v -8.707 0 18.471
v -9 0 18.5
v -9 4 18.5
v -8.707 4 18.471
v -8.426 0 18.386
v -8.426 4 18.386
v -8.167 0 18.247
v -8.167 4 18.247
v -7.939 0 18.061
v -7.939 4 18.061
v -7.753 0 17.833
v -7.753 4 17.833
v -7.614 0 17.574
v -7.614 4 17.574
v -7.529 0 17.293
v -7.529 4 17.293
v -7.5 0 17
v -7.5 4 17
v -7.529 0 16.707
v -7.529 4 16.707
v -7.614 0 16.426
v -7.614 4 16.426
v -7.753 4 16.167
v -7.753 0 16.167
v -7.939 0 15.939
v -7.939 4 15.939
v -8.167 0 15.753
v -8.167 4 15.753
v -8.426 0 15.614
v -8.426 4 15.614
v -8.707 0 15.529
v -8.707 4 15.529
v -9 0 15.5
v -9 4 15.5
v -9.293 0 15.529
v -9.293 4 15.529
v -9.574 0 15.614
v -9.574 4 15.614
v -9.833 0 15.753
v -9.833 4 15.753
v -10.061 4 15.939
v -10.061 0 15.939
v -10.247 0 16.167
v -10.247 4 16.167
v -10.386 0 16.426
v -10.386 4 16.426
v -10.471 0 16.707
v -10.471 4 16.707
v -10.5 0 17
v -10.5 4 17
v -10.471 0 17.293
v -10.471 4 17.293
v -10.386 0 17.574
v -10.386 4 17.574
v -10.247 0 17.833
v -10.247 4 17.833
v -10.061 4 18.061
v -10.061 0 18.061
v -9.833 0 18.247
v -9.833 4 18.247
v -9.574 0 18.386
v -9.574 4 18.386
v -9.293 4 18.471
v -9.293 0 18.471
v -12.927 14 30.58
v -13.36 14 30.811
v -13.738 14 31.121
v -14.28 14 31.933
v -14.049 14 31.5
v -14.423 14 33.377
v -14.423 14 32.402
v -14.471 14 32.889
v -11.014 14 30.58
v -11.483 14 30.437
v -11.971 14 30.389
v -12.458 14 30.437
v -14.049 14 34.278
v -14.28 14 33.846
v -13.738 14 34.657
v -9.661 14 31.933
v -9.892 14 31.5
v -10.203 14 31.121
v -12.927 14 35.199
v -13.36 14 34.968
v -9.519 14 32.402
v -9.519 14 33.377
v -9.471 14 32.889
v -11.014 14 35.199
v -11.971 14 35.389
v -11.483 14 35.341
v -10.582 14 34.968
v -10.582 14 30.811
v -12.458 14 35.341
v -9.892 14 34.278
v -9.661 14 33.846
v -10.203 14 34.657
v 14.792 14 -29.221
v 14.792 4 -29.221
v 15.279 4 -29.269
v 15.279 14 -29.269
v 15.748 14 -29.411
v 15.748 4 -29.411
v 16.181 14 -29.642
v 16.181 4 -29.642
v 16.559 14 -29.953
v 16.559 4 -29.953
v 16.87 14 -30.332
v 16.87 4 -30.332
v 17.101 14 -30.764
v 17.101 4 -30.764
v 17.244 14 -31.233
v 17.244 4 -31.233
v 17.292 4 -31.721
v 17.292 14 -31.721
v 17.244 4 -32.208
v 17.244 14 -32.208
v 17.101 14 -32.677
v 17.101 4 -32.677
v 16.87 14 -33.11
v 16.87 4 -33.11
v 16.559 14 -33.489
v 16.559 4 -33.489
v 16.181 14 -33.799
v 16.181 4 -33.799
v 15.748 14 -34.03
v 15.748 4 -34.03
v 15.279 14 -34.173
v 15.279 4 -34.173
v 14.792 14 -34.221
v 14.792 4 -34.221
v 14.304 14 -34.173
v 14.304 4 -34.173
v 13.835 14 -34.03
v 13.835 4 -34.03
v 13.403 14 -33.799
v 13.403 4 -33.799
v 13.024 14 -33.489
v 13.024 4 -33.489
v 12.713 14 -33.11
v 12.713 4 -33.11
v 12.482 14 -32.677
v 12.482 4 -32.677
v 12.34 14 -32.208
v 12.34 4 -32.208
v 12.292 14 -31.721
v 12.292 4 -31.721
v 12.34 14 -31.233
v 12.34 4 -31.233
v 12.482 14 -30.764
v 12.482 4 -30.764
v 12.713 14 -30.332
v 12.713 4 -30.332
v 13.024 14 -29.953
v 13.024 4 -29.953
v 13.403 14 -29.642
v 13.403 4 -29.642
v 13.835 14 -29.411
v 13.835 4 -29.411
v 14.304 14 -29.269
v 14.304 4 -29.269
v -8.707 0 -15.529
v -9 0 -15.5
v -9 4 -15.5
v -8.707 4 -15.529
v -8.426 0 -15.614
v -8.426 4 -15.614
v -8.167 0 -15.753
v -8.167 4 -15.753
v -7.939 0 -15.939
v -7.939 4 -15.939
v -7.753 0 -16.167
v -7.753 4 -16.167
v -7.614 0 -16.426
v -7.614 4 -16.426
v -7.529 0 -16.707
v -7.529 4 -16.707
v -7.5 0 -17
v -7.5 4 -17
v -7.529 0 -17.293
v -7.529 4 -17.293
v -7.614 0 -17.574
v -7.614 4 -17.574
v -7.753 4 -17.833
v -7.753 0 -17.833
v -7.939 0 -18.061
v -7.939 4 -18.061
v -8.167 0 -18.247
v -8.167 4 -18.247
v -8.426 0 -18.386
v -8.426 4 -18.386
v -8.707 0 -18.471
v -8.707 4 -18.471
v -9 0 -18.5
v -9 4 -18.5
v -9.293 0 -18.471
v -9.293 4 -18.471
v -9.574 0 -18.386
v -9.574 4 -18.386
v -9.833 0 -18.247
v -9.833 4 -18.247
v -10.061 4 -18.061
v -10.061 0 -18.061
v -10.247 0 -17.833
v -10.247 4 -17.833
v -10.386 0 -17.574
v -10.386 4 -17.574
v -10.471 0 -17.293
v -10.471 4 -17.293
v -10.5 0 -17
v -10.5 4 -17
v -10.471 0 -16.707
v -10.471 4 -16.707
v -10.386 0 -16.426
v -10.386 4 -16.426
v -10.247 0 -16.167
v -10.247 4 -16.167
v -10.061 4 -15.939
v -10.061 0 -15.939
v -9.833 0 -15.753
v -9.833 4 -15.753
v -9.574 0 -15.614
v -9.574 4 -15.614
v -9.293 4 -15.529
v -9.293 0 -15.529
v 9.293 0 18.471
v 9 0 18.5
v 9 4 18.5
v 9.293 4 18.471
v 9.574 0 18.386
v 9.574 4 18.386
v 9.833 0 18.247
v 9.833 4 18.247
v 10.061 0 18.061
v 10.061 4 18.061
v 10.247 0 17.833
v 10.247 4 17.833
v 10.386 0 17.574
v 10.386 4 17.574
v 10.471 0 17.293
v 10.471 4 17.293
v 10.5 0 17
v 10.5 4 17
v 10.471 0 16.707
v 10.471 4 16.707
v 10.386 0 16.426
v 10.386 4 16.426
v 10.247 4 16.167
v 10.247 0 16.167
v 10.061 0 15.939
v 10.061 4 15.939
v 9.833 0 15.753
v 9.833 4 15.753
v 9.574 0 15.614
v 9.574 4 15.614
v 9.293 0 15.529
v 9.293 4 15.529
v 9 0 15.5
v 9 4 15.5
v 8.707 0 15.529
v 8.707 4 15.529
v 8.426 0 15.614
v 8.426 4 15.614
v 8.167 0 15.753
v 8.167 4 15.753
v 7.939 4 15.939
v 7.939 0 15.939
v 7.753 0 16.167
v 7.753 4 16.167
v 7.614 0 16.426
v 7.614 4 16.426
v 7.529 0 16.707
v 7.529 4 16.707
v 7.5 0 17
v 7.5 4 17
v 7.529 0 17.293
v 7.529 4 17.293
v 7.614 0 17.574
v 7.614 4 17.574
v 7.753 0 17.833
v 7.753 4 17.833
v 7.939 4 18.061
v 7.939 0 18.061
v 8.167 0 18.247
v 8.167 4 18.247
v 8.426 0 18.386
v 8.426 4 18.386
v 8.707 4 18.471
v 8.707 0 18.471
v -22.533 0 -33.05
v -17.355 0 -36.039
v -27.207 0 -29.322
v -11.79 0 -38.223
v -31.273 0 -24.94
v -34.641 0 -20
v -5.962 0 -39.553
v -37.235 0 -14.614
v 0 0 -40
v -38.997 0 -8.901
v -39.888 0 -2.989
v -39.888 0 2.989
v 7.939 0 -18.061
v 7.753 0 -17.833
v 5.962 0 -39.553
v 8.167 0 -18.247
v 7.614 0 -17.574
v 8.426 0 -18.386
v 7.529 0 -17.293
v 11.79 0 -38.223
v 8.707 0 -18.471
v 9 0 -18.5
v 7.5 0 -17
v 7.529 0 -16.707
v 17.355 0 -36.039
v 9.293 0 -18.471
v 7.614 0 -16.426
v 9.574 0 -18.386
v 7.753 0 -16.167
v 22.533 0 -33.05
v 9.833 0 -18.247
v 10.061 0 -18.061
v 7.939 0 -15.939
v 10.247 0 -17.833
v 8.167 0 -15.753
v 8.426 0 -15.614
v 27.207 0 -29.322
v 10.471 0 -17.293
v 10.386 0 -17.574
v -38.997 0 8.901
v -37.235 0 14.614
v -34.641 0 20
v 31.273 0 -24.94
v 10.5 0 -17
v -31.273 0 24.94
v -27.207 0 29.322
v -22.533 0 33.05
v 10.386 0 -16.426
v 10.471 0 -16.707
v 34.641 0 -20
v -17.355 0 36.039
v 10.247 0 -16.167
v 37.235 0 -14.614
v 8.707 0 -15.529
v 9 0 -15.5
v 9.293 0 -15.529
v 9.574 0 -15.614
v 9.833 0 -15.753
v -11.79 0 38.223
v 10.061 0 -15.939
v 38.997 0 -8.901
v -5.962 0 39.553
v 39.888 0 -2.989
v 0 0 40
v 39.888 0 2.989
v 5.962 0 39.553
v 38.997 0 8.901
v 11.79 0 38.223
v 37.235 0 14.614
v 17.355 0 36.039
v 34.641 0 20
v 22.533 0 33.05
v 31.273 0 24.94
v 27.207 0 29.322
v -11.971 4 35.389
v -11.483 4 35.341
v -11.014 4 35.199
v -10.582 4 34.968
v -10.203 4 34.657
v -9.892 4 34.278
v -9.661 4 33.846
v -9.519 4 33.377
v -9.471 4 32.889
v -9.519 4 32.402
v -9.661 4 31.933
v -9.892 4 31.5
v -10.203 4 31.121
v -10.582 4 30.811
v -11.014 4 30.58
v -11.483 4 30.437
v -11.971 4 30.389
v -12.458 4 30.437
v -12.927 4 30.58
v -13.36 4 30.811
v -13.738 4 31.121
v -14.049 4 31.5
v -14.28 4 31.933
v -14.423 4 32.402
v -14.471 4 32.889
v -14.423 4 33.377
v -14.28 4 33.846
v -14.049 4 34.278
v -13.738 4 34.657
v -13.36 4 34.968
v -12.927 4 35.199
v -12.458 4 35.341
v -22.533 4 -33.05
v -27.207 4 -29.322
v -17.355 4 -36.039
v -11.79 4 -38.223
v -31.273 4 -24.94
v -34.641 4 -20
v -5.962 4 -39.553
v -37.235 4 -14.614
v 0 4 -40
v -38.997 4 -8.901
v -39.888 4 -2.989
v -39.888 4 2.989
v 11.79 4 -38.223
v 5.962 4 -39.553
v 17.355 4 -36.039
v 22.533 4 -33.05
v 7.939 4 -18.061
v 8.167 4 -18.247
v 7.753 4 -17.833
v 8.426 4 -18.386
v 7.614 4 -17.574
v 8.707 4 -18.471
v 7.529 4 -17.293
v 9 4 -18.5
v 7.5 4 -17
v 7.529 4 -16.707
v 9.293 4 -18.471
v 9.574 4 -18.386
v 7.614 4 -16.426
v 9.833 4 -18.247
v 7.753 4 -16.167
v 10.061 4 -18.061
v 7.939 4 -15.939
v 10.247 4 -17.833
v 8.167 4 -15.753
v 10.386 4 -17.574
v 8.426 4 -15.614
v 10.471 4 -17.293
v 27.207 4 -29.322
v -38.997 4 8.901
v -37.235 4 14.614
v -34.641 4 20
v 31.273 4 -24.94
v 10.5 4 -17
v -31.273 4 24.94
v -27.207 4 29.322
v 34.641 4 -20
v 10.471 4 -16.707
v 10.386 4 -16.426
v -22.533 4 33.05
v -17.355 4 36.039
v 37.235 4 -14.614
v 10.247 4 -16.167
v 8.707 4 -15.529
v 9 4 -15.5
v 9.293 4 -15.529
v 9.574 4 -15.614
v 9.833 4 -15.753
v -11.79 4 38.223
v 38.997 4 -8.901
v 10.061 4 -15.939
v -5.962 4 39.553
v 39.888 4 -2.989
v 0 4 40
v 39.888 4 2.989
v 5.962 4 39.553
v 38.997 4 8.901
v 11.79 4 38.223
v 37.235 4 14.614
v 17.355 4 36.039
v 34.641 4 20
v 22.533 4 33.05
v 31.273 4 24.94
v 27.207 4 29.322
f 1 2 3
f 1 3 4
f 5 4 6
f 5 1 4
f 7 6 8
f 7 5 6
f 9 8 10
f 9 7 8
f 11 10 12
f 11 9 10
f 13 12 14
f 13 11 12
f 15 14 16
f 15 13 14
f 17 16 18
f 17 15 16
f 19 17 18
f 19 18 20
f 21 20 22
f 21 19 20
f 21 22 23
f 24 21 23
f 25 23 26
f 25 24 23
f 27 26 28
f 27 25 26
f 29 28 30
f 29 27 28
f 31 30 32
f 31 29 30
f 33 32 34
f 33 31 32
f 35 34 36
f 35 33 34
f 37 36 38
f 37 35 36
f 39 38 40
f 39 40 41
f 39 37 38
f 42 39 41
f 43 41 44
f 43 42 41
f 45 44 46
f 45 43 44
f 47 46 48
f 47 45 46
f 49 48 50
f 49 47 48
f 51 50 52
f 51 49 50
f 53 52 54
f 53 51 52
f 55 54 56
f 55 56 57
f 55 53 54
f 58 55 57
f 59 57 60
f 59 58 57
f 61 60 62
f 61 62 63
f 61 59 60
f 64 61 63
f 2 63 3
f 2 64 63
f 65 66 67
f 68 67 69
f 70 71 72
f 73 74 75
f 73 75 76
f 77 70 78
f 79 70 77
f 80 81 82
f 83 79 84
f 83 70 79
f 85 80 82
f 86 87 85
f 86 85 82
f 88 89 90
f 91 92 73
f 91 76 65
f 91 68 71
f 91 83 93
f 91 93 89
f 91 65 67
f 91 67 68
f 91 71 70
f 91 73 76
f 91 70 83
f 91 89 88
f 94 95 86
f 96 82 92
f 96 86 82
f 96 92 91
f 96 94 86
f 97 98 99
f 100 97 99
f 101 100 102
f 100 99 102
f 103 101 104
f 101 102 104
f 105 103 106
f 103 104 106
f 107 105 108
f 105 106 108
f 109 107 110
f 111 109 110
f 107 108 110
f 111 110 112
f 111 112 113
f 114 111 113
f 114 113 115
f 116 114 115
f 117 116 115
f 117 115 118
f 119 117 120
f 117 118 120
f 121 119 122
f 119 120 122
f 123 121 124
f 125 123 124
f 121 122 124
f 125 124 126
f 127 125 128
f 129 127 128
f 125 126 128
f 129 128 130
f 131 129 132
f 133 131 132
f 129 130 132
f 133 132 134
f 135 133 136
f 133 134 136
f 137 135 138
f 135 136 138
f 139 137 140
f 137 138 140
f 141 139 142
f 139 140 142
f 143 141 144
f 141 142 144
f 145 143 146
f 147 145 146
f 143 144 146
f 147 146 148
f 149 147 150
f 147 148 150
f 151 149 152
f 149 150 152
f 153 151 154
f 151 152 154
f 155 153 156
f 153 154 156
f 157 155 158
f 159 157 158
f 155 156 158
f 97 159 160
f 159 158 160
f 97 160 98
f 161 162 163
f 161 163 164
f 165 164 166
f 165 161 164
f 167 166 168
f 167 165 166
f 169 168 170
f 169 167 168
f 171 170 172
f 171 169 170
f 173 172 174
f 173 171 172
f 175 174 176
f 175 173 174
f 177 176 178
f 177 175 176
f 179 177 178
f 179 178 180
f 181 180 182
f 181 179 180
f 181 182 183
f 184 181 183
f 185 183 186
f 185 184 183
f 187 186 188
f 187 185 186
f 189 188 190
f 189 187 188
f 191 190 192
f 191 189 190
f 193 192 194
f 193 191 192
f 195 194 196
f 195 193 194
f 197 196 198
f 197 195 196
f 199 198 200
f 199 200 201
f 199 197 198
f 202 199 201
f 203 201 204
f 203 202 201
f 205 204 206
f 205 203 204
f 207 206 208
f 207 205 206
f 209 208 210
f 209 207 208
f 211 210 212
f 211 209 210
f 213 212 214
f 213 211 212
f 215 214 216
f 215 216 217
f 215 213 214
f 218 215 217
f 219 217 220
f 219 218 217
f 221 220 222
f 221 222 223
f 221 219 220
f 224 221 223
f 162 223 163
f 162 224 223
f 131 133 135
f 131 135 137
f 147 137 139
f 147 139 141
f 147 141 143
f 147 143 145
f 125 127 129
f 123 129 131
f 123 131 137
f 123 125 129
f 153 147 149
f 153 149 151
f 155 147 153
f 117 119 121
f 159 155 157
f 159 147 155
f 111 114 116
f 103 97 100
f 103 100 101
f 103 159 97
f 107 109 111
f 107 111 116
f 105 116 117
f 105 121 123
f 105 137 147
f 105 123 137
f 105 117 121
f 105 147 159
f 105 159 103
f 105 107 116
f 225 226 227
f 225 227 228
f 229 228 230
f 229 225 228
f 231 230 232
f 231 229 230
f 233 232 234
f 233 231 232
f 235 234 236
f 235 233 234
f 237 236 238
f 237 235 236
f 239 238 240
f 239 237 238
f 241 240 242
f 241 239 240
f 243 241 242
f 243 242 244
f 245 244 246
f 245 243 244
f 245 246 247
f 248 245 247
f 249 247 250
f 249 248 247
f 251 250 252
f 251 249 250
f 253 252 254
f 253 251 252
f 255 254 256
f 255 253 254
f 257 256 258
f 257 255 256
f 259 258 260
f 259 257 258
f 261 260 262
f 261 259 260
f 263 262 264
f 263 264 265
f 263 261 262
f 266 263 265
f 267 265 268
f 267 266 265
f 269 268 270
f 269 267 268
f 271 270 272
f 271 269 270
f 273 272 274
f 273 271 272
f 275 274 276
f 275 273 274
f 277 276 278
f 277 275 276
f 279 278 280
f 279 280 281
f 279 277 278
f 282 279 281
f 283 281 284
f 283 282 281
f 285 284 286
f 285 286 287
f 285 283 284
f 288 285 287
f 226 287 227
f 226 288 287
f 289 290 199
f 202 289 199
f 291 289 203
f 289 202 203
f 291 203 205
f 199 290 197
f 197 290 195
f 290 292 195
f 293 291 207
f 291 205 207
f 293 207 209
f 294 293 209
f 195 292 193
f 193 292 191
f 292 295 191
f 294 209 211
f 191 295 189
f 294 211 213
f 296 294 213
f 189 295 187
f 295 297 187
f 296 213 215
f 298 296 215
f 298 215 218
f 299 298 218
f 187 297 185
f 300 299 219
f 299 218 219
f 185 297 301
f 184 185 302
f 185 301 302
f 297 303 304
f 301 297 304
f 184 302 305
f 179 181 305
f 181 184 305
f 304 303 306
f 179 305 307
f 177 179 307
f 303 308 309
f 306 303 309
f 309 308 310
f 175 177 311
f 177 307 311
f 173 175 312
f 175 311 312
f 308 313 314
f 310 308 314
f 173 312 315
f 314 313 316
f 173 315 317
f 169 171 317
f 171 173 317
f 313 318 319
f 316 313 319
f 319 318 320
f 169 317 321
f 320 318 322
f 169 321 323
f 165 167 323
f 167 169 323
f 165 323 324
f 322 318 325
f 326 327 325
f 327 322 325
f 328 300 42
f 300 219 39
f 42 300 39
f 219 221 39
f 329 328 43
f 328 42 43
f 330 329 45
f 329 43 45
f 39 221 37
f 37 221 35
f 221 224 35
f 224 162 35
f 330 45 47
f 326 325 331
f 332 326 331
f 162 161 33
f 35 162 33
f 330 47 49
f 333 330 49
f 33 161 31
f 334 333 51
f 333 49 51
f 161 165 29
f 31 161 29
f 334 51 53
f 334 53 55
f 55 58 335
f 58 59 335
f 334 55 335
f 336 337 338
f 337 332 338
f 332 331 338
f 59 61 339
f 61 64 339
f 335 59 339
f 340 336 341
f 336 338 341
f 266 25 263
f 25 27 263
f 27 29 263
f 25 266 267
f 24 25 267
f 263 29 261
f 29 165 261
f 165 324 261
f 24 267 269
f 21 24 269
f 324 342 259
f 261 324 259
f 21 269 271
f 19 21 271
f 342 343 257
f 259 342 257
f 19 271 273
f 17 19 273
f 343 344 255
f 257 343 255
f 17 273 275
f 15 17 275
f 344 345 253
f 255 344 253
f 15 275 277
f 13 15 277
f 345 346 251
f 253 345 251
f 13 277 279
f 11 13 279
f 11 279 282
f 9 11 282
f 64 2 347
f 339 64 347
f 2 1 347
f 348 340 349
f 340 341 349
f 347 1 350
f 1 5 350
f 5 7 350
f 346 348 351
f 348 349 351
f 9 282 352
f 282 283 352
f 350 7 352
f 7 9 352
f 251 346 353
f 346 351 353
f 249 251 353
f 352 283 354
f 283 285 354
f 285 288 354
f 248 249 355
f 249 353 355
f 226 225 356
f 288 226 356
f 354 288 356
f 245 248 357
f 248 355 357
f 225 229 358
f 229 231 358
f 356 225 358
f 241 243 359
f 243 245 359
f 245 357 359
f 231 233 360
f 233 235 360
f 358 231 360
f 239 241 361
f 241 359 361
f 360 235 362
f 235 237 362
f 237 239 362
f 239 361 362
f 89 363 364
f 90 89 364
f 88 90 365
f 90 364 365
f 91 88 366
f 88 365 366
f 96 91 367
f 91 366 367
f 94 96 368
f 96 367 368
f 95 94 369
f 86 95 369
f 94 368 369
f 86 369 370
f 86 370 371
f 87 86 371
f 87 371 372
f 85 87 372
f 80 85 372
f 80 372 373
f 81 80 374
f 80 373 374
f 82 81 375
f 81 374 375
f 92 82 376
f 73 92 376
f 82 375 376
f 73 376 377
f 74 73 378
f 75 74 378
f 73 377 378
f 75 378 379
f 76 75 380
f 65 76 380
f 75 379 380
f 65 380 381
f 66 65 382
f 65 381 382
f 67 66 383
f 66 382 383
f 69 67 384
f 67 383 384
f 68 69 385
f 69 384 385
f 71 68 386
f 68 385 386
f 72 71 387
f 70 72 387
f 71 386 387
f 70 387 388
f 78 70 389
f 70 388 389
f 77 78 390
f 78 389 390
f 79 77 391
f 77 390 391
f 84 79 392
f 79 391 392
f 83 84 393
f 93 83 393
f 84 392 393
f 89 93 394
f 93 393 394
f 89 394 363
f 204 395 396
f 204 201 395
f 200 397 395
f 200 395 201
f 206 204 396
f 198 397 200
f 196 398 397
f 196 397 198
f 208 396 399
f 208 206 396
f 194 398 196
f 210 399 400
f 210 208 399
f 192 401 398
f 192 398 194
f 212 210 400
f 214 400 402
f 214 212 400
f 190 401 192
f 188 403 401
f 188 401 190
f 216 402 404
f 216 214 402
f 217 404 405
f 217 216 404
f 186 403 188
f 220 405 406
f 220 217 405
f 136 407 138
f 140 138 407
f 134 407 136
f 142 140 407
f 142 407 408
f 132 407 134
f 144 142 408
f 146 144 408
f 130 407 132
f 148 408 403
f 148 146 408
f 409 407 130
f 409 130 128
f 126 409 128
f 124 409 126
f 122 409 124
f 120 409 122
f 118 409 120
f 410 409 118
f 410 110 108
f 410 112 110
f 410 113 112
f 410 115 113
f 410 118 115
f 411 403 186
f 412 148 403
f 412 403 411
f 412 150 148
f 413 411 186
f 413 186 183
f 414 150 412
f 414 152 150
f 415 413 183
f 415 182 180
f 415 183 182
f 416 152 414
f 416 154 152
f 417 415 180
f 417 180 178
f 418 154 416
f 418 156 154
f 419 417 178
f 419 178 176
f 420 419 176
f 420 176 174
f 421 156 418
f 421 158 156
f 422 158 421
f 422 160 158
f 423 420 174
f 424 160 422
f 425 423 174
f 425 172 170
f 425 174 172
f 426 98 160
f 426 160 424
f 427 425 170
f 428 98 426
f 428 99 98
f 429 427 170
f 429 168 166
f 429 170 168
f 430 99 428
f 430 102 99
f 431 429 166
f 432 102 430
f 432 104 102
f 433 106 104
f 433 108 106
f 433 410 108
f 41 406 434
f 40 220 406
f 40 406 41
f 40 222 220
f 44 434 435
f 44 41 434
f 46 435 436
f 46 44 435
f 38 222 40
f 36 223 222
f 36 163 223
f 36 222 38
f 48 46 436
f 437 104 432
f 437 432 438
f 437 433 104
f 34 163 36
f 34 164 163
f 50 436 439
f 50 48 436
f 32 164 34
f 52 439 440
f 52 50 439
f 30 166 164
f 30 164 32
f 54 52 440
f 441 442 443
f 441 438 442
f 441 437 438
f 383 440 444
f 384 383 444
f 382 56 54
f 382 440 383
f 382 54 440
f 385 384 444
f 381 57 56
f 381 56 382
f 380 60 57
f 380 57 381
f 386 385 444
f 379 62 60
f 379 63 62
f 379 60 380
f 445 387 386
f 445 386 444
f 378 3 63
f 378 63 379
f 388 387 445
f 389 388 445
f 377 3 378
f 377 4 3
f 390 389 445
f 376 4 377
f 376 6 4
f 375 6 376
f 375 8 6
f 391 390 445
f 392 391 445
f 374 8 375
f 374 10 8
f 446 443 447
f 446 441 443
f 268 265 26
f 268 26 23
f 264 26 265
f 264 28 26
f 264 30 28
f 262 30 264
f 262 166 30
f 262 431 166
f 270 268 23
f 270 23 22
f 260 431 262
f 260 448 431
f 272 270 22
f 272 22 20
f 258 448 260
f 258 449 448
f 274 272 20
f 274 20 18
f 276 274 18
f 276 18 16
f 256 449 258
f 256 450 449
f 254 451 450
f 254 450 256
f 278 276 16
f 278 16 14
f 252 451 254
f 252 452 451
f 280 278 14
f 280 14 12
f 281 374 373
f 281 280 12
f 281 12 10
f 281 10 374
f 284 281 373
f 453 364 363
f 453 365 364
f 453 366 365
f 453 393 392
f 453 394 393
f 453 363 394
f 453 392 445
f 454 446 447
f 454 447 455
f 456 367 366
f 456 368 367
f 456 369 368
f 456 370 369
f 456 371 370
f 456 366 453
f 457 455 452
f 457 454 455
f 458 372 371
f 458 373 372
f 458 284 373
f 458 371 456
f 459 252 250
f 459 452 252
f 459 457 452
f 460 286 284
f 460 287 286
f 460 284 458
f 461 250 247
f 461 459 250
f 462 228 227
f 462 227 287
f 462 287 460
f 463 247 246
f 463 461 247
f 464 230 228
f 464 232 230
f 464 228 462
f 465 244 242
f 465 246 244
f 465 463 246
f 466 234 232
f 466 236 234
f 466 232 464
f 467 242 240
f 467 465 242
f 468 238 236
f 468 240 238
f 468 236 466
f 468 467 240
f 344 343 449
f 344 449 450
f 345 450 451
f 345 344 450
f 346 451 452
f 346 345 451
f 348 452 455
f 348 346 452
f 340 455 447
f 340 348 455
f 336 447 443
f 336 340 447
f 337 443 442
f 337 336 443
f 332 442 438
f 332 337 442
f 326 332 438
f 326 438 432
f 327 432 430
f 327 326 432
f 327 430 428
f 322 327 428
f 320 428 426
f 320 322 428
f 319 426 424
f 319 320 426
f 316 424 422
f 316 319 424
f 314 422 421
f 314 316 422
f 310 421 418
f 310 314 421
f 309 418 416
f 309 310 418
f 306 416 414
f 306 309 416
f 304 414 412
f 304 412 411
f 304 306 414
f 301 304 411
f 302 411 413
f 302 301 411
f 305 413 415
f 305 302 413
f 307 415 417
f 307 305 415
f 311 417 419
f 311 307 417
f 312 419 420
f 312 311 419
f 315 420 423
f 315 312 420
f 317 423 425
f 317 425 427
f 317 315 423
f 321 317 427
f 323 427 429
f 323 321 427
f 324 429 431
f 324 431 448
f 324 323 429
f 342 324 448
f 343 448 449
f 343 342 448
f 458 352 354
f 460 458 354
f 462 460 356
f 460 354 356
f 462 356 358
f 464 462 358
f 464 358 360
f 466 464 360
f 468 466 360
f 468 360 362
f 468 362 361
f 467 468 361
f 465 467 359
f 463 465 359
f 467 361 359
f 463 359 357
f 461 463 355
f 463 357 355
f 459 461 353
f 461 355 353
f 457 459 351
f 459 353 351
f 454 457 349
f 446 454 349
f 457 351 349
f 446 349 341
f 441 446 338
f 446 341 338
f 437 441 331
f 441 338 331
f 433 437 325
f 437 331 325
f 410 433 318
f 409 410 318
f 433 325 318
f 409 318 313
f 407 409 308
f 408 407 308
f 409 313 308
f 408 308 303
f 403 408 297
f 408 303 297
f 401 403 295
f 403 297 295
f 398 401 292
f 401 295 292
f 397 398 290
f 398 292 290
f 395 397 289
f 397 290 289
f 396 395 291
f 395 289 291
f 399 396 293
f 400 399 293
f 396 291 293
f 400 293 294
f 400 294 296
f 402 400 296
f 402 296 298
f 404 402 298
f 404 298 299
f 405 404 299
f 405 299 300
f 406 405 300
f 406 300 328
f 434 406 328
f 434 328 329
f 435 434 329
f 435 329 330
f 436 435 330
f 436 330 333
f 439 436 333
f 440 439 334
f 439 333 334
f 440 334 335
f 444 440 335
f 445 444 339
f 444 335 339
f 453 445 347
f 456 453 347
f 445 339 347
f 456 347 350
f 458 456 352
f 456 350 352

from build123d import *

# Parameters (mm, degrees)
SKETCH1_R           = 40
SKETCH1_R_2         = 1.5
BOSS_EXTRUDE1_DEPTH = 4
SKETCH2_R           = 2.5
BOSS_EXTRUDE2_DEPTH = 10


with BuildPart() as part:
    # Sketch1 → Boss-Extrude1 (new body)
    with BuildSketch(Plane(origin=(0, 0, 0), x_dir=(1, 0, 0), z_dir=(0, 1, 0))):
        with Locations(Location((0, 0, 0), (0, 0, 270))):
            Circle(SKETCH1_R)
        with Locations(Location((9, 17, 0), (0, 0, 270))):
            Circle(SKETCH1_R_2, mode=Mode.SUBTRACT)
        with Locations(Location((-9, 17, 0), (0, 0, 270))):
            Circle(SKETCH1_R_2, mode=Mode.SUBTRACT)
        with Locations(Location((-9, -17, 0), (0, 0, 270))):
            Circle(SKETCH1_R_2, mode=Mode.SUBTRACT)
        with Locations(Location((9, -17, 0), (0, 0, 270))):
            Circle(SKETCH1_R_2, mode=Mode.SUBTRACT)
    extrude(amount=BOSS_EXTRUDE1_DEPTH)

    # Sketch2 → Boss-Extrude2 (add)
    with BuildSketch(Plane(origin=(0, 4, 0), x_dir=(1, 0, 0), z_dir=(0, 1, 0))):
        with Locations(Location((14.791639161, 31.720772546, 0), (0, 0, 270))):
            Circle(SKETCH2_R)
        with Locations(Location((-11.970705016, -32.889241728, 0), (0, 0, 270))):
            Circle(SKETCH2_R)
    extrude(amount=BOSS_EXTRUDE2_DEPTH)


solid = part.part
